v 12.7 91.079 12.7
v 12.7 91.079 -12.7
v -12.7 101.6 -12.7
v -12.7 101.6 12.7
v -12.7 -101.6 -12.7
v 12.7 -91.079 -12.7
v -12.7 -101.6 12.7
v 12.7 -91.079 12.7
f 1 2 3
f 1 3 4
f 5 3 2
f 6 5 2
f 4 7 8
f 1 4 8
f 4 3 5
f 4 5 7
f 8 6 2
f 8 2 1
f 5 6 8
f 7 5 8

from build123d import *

# Parameters (mm, degrees)
F0_W       = 25.4
F0_H       = 25.4
F1_DEPTH   = 101.6
F2_SIZE2   = 10.521014
F2_SIZE    = 25.39999
F2_2_SIZE2 = 10.521014
F2_2_SIZE  = 25.39999


# Not quite as in the source:
# - a fillet or chamfer is up to 0.001 mm smaller than in the source, because OpenCascade refuses the exact size


with BuildPart() as f1:
    # F0 (on Front) → F1 (new body, symmetric)
    with BuildSketch(Plane.XZ):
        Rectangle(F0_W, F0_H)
    extrude(amount=F1_DEPTH, both=True)

    # F2 (size 25.4 and 10.5210244843 in the source; OpenCascade refuses exactly that, so slightly less here)
    f2_edges = [f1.edges().sort_by_distance(p)[0] for p in [
        (12.7, -101.6, 0),
    ]]
    f2_side = f1.faces().sort_by_distance((0, -101.6, 0))[0]
    chamfer(f2_edges, length=F2_SIZE, length2=F2_SIZE2, reference=f2_side)

    # F2#2 (size 25.4 and 10.5210244843 in the source; OpenCascade refuses exactly that, so slightly less here)
    f2_2_edges = [f1.edges().sort_by_distance(p)[0] for p in [
        (12.7, 101.6, 0),
    ]]
    f2_2_side = f1.faces().sort_by_distance((0, 101.6, 0))[0]
    chamfer(f2_2_edges, length=F2_2_SIZE, length2=F2_2_SIZE2, reference=f2_2_side)


solid = f1.part
